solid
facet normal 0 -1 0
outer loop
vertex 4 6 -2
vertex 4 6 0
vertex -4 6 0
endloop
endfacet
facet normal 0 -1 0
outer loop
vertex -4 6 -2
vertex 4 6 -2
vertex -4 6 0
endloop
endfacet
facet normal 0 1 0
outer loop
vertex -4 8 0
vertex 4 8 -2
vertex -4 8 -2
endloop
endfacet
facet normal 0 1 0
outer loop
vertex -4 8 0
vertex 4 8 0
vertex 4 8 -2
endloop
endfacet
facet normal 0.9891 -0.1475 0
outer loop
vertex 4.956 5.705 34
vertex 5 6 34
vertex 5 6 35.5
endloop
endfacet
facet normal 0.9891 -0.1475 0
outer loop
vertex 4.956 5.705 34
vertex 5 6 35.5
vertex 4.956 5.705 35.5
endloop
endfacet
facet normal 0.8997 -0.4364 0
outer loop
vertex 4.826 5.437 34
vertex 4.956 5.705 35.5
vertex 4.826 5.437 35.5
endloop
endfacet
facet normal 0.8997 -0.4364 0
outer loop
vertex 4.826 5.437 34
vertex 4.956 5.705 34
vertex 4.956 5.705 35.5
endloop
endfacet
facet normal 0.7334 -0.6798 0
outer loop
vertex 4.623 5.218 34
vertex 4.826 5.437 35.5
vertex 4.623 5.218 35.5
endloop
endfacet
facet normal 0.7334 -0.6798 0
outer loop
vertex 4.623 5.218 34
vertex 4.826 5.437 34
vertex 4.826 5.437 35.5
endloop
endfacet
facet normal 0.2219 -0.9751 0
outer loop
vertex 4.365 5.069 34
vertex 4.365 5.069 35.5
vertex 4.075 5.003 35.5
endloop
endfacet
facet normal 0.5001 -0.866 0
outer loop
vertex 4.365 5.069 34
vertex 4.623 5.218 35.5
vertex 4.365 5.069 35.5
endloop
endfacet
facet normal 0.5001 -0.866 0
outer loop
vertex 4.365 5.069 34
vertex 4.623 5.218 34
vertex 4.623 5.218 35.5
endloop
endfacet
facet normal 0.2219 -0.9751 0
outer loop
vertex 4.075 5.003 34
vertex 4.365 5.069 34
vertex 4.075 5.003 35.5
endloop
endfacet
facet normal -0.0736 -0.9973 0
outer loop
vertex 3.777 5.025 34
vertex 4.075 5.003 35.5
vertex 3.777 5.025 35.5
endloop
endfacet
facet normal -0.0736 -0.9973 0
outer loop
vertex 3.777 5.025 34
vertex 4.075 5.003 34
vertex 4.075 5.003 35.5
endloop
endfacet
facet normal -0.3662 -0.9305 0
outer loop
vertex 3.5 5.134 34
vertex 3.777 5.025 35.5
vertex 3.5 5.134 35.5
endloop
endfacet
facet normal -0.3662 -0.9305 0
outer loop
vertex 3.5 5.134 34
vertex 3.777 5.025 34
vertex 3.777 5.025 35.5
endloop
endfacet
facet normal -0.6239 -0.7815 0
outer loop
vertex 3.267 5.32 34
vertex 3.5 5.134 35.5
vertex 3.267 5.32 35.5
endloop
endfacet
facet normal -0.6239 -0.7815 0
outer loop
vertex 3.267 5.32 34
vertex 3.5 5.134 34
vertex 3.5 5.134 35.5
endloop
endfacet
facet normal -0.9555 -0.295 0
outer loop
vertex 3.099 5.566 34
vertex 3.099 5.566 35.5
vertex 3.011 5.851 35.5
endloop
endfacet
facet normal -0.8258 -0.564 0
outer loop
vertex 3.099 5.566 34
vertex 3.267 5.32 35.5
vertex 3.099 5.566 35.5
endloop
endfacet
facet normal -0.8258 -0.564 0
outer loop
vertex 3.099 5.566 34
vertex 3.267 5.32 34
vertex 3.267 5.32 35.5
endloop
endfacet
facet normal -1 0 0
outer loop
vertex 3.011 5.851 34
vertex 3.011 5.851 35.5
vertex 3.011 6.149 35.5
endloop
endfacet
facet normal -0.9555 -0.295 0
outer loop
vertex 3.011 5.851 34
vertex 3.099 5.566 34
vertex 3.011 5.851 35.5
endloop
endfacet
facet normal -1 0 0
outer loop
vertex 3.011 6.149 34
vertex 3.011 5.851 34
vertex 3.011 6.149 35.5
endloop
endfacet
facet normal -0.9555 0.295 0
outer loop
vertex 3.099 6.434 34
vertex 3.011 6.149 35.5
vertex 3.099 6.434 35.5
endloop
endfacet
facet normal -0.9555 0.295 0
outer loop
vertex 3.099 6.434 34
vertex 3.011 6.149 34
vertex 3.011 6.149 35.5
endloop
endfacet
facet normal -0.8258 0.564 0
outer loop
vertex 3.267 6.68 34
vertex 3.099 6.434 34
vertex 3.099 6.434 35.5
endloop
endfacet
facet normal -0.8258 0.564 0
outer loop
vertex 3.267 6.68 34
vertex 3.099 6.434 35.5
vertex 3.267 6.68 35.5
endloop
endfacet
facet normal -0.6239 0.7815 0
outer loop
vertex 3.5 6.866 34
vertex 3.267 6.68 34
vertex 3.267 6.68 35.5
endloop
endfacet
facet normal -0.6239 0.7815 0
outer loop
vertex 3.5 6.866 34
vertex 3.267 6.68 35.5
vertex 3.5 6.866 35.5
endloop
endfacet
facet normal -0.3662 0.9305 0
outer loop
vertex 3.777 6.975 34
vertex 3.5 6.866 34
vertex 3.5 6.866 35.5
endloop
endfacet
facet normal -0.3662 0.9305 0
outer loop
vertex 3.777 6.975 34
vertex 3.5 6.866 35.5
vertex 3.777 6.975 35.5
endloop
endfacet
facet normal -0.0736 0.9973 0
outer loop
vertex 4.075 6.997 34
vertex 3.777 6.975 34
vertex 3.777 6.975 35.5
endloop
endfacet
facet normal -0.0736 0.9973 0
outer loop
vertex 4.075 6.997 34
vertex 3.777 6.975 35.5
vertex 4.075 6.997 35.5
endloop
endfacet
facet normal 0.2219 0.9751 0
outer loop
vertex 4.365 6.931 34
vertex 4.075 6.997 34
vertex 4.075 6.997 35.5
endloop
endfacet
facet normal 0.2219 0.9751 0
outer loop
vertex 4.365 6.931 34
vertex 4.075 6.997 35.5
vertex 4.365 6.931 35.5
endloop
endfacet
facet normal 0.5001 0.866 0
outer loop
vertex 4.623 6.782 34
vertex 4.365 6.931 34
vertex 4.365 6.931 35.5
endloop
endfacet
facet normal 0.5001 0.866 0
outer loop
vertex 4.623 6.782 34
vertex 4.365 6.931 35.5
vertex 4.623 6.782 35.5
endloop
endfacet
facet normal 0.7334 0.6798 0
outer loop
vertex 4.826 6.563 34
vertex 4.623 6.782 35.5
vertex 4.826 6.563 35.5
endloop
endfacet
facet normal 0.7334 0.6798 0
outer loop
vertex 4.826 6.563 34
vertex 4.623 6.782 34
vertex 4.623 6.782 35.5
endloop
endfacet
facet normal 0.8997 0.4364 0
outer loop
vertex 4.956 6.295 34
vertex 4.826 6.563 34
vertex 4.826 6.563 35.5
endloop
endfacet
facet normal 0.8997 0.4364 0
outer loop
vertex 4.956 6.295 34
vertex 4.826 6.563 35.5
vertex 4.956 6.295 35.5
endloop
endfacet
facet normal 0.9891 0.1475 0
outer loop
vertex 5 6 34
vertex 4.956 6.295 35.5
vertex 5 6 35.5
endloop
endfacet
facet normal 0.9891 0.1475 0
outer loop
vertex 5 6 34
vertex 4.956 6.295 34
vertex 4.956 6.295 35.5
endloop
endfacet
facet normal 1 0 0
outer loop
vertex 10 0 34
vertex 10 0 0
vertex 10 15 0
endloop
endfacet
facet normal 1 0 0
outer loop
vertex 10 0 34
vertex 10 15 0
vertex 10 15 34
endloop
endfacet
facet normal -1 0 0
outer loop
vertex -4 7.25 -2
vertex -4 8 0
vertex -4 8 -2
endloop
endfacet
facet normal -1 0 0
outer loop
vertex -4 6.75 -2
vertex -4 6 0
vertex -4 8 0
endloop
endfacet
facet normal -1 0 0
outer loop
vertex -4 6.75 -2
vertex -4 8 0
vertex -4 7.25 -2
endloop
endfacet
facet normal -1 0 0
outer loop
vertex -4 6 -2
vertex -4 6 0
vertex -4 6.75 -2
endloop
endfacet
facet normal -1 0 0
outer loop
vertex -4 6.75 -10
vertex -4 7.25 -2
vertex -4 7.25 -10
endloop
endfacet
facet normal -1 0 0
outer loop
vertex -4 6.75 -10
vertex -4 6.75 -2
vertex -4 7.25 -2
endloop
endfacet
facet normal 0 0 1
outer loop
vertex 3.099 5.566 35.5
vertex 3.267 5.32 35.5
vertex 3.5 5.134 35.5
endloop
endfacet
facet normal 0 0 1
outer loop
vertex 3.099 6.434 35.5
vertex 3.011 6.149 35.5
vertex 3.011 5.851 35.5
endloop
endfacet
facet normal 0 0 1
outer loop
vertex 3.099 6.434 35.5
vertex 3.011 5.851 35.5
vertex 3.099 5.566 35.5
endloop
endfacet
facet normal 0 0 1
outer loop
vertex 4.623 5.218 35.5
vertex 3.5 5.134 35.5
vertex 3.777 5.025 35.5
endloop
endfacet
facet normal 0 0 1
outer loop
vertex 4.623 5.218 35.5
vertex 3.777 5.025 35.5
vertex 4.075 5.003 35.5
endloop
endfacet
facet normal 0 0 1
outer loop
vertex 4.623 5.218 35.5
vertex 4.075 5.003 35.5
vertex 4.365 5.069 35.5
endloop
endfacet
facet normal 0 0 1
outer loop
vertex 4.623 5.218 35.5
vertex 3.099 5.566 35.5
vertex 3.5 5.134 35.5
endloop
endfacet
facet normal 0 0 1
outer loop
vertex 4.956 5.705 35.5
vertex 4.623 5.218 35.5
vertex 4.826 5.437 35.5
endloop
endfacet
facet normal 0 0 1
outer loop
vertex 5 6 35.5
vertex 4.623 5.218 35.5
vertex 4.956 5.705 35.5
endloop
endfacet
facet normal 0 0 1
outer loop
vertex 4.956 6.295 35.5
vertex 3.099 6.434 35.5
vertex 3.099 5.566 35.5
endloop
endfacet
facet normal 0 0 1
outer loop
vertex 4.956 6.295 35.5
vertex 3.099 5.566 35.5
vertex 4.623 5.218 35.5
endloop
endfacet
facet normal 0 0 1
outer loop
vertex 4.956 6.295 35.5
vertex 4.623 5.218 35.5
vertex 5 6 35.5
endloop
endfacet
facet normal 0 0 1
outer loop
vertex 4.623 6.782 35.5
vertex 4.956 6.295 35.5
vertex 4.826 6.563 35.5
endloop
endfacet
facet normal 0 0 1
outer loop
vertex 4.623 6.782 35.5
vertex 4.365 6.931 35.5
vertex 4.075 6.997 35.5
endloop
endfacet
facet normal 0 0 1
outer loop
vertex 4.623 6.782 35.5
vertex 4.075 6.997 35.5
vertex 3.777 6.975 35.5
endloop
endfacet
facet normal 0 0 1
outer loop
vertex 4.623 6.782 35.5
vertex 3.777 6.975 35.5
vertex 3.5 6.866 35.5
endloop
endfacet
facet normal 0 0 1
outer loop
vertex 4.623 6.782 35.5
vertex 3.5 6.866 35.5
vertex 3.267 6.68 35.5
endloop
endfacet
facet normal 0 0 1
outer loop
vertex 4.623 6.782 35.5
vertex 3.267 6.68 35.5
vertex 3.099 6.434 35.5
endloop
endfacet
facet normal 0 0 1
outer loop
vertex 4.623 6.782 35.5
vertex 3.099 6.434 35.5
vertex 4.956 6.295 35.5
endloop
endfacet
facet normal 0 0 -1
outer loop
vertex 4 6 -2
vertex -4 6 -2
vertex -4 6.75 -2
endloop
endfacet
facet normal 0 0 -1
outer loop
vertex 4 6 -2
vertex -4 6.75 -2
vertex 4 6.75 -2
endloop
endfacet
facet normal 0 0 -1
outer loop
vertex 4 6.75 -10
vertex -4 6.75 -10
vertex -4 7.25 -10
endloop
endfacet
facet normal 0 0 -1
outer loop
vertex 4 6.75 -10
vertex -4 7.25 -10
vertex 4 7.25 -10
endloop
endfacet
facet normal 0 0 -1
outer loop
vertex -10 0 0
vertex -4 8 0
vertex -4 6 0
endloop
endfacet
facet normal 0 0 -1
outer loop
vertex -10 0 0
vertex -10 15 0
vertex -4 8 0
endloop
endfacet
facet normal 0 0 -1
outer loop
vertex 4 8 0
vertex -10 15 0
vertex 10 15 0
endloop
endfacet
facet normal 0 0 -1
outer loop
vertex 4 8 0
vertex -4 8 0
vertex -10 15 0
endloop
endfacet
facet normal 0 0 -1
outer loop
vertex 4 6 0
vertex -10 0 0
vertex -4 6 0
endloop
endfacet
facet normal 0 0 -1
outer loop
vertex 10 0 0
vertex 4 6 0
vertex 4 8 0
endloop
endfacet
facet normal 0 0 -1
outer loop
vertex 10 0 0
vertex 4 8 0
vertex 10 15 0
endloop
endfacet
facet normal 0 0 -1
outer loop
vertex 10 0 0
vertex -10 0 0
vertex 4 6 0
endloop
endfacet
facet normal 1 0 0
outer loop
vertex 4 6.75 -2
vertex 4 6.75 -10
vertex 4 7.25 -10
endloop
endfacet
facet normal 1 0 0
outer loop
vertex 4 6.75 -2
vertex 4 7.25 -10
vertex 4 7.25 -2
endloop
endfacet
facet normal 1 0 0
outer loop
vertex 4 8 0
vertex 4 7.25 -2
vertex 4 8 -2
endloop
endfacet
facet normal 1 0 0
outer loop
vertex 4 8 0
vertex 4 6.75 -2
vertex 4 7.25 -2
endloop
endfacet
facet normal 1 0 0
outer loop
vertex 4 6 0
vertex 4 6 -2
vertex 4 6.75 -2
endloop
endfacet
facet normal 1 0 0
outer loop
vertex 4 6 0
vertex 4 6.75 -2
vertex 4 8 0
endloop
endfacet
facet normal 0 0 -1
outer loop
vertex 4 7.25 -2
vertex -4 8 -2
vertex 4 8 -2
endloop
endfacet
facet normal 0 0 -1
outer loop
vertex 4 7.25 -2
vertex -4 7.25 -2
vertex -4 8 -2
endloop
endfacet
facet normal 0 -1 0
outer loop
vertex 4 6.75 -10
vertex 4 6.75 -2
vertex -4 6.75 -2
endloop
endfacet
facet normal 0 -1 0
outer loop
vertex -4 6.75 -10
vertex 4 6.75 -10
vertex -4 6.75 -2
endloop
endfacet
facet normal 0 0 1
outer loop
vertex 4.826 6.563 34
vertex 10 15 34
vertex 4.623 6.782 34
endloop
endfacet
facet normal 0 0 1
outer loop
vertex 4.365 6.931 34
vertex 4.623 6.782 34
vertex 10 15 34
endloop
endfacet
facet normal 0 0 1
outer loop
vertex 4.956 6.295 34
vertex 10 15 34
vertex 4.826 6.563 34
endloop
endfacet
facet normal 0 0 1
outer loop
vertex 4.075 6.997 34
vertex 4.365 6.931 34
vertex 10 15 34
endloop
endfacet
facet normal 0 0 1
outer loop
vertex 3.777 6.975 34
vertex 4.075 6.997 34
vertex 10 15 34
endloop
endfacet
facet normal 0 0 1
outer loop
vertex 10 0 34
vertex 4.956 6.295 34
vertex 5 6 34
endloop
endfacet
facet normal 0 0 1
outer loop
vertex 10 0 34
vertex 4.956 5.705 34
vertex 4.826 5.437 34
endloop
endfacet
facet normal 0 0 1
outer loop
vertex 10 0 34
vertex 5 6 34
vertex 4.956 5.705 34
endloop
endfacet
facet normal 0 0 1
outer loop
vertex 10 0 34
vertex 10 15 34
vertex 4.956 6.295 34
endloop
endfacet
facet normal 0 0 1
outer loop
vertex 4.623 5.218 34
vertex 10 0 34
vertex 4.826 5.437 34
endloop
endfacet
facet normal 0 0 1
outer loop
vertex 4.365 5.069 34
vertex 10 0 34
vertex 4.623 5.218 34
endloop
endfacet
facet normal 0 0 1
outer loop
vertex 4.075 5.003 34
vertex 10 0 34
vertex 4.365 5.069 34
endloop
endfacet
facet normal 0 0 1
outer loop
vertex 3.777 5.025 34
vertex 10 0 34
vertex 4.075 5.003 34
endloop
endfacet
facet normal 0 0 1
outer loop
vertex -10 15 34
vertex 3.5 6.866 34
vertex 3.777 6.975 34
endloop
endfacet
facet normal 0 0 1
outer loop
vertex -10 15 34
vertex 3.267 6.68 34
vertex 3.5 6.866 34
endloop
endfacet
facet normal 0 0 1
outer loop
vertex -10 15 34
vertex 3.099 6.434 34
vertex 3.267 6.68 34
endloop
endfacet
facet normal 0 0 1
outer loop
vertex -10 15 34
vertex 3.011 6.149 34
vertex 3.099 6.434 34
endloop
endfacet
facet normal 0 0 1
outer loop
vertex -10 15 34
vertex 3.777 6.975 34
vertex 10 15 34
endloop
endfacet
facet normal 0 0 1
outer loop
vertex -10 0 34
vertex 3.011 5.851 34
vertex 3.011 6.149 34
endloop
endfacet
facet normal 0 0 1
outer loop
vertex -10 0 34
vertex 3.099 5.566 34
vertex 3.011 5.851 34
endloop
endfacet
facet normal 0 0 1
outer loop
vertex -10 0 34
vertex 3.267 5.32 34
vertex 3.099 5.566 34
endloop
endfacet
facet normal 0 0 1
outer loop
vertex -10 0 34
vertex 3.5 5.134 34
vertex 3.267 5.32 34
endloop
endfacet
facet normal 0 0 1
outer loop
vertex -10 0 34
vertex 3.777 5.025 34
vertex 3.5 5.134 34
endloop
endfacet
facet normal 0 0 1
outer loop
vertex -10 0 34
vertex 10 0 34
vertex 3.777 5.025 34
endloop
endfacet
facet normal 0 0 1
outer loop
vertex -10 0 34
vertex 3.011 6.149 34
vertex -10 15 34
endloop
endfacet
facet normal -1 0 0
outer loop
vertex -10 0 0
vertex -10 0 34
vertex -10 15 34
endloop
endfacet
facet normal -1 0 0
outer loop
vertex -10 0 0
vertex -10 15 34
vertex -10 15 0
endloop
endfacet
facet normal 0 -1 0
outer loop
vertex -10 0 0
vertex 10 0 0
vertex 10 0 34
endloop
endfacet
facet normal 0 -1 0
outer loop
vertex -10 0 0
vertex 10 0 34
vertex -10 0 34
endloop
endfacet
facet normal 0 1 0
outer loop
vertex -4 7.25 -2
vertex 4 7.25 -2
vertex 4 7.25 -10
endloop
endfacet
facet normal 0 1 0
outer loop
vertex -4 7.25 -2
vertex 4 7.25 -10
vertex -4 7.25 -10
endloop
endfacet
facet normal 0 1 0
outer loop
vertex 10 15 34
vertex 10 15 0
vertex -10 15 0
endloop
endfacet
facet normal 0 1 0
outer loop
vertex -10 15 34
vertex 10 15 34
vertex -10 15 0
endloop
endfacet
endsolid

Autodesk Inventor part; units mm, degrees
ref_plane "YZ Plane" through (0, 0, 0) normal (1, 0, 0) x (0, 1, 0)
ref_plane "XZ Plane" through (0, 0, 0) normal (0, 1, 0) x (-1, 0, 0)
ref_plane "XY Plane" through (0, 0, 0) normal (0, 0, 1) x (1, 0, 0)
sketch "Sketch1" plane through (0, 0, 0) normal (0, 1, 0) x (-1, 0, 0)
  line L0 (-10, 34) -> (10, 34)
  line L1 (10, 34) -> (10, 0)
  line L2 (10, 0) -> (-10, 0)
  line L3 (-10, 0) -> (-10, 34)
  line L4 (-4, 0) -> (4, 0)
  line L5 (4, 0) -> (4, -2)
  line L6 (4, -2) -> (-4, -2)
  line L7 (-4, -2) -> (-4, 0)
  line L8 (-4, -2) -> (4, -2)
  line L9 (4, -2) -> (4, -10)
  line L10 (4, -10) -> (-4, -10)
  line L11 (-4, -10) -> (-4, -2)
  dimension "d0" = 20
  dimension "d3" = 2
  dimension "d4" = 8
  dimension "d5" = 44
  dimension "d6" = 34
extrude "Extrusion1" add sketch "Sketch1" along normal blind 15 contours L0 L1 L2 L3
extrude "Extrusion2" add sketch "Sketch1" along normal blind 7 contours L2 L5 L6 L7
extrude "Extrusion3" add sketch "Sketch1" along normal blind 7 contours L6 L9 L10 L11
extrude "Extrusion4" cut sketch "Sketch1" along normal blind 8 contours L2 L5 L6 L7
extrude "Extrusion5" add sketch "Sketch1" along normal blind 8 contours L2 L5 L6 L7
extrude "Extrusion6" cut sketch "Sketch1" along normal blind 6 contours L2 L5 L6 L7
extrude "Extrusion7" add sketch "Sketch1" along normal blind 7.25 contours L6 L9 L10 L11
extrude "Extrusion8" cut sketch "Sketch1" along normal blind 6.75 contours L6 L9 L10 L11
sketch "Sketch2" plane through (-10, 0, 34) normal (0, 0, 1) x (1, 0, 0)
  circle A0 centre (14, 6) radius 1
  point P0 (10, 0)
  dimension "d25" = 2
extrude "Extrusion9" add sketch "Sketch2" along normal blind 1.5
sketch "Sketch3" plane through (10, 0, 34) normal (1, 0, 0) x (0, 0, -1)
  line L0 (0, 0) -> (34, 0) projected
  line L1 (34, 0) -> (34, 15) projected
  line L2 (0, 15) -> (34, 15) projected
  line L3 (0, 0) -> (0, 15) projected
  dimension "d28" = 15
sketch "Sketch5" plane through (0, 15, 0) normal (0, 1, 0) x (1, 0, 0)
  point P0 (0, 0)
properties part number "VReg"
